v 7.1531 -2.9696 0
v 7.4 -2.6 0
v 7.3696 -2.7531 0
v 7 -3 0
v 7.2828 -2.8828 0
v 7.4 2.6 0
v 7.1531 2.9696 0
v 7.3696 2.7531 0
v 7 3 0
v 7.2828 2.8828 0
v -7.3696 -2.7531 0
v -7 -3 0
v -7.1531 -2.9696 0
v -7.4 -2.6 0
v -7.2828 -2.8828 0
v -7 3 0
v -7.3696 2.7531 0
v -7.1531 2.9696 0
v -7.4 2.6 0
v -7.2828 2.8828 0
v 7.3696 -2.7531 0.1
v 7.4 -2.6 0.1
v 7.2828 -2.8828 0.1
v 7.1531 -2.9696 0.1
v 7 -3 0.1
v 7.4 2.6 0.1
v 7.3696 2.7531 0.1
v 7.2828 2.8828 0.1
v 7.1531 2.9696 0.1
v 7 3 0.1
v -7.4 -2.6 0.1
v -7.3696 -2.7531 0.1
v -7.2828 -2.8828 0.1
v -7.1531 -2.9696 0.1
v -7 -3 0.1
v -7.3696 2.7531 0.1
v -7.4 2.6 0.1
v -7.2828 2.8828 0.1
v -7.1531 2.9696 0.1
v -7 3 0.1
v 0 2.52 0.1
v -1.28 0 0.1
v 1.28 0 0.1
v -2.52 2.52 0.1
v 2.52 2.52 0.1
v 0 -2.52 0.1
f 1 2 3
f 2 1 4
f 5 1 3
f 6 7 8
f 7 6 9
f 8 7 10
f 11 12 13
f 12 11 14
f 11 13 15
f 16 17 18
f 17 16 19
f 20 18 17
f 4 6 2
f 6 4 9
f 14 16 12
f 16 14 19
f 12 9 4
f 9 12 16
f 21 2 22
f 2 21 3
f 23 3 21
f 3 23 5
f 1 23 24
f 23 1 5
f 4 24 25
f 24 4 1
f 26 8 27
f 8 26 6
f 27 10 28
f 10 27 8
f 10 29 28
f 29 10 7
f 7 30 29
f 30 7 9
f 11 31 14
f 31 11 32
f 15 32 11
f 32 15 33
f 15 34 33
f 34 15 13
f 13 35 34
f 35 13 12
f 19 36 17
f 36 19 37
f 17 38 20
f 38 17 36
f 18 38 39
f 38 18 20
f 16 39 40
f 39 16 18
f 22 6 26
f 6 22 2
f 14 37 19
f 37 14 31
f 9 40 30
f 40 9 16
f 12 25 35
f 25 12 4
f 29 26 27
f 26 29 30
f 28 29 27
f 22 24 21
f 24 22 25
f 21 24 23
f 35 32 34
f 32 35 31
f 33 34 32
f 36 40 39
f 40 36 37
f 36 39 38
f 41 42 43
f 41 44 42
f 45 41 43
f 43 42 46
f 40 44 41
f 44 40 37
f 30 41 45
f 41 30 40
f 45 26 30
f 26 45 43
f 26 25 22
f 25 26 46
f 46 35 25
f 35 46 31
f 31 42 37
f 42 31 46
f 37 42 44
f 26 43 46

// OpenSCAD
// file: ../p/1-4cyli.scad
use <../lib.scad>
function ldraw_lib__1_4cyli() = [
// 0 Cylinder 0.25
// 0 Name: 1-4cyli.dat
// 0 Author: James Jessiman
// 0 !LDRAW_ORG Primitive UPDATE 2012-01
// 0 !LICENSE Licensed under CC BY 4.0 : see CAreadme.txt
// 
// 0 BFC CERTIFY CCW
  [0,"BFC","CERTIFY"],
  [0,"BFC","CCW"],
// 
// 0 !HISTORY 2002-03-23 [sbliss] Added BFC statement.
// 0 !HISTORY 2002-04-25 [PTadmin] Official Update 2002-02
// 0 !HISTORY 2007-06-22 [PTadmin] Header formatted for Contributor Agreement
// 0 !HISTORY 2008-07-01 [PTadmin] Official Update 2008-01
// 0 !HISTORY 2012-02-16 [Philo] Changed to CCW
// 0 !HISTORY 2012-03-30 [PTadmin] Official Update 2012-01
// 
// 
// 4 16 1 1 0 0.9239 1 0.3827 0.9239 0 0.3827 1 0 0
  [4,16,1,1,0,0.9239,1,0.3827,0.9239,0,0.3827,1,0,0],
// 5 24 1 0 0 1 1 0 0.9239 0 0.3827 1 0 -1
  [5,24,1,0,0,1,1,0,0.9239,0,0.3827,1,0,-1],
// 4 16 0.9239 1 0.3827 0.7071 1 0.7071 0.7071 0 0.7071 0.9239 0 0.3827
  [4,16,0.9239,1,0.3827,0.7071,1,0.7071,0.7071,0,0.7071,0.9239,0,0.3827],
// 5 24 0.9239 0 0.3827 0.9239 1 0.3827 0.7071 0 0.7071 1 0 0
  [5,24,0.9239,0,0.3827,0.9239,1,0.3827,0.7071,0,0.7071,1,0,0],
// 4 16 0.7071 1 0.7071 0.3827 1 0.9239 0.3827 0 0.9239 0.7071 0 0.7071
  [4,16,0.7071,1,0.7071,0.3827,1,0.9239,0.3827,0,0.9239,0.7071,0,0.7071],
// 5 24 0.7071 0 0.7071 0.7071 1 0.7071 0.3827 0 0.9239 0.9239 0 0.3827
  [5,24,0.7071,0,0.7071,0.7071,1,0.7071,0.3827,0,0.9239,0.9239,0,0.3827],
// 4 16 0.3827 1 0.9239 0 1 1 0 0 1 0.3827 0 0.9239
  [4,16,0.3827,1,0.9239,0,1,1,0,0,1,0.3827,0,0.9239],
// 5 24 0.3827 0 0.9239 0.3827 1 0.9239 0 0 1 0.7071 0 0.7071
  [5,24,0.3827,0,0.9239,0.3827,1,0.9239,0,0,1,0.7071,0,0.7071],
// 5 24 0 0 1 0 1 1 0.3827 0 0.9239 -1 0 1
  [5,24,0,0,1,0,1,1,0.3827,0,0.9239,-1,0,1],
];
module ldraw_lib__1_4cyli(step=0, col=false, unit=2/5, alt=false, line=0.2, solid=!$preview)
    makepoly(ldraw_lib__1_4cyli(), step=step, col=col, unit=unit, alt=alt, line=line, solid=solid);
ldraw_lib__1_4cyli(line=0.2);
// file: ../p/1-4chrd.scad
use <../lib.scad>
function ldraw_lib__1_4chrd() = [
// 0 Chord 0.25
// 0 Name: 1-4chrd.dat
// 0 Author: Max Martin Richter [MMR1988]
// 0 !LDRAW_ORG Primitive UPDATE 2023-05
// 0 !LICENSE Licensed under CC BY 4.0 : see CAreadme.txt
// 
// 0 BFC CERTIFY CCW
  [0,"BFC","CERTIFY"],
  [0,"BFC","CCW"],
// 
// 0 !HISTORY 2004-04-22 [PTadmin] Official Update 2004-02
// 0 !HISTORY 2007-10-09 [PTadmin] Header formatted for Contributor Agreement
// 0 !HISTORY 2008-07-01 [PTadmin] Official Update 2008-01
// 0 !HISTORY 2012-08-02 [MMR1988] Re-creation with PrimGen2 and Rectifier
// 0 !HISTORY 2012-08-09 [PTadmin] Official Update 2012-02
// 0 !HISTORY 2023-10-27 [OrionP] Change author to MMR1988 from hafhead
// 0 !HISTORY 2023-10-31 [OrionP] Official Update 2023-05
// 
// 4 16 0.9239 0 0.3827 0.3827 0 0.9239 0 0 1 1 0 0
  [4,16,0.9239,0,0.3827,0.3827,0,0.9239,0,0,1,1,0,0],
// 3 16 0.7071 0 0.7071 0.3827 0 0.9239 0.9239 0 0.3827
  [3,16,0.7071,0,0.7071,0.3827,0,0.9239,0.9239,0,0.3827],
];
module ldraw_lib__1_4chrd(step=0, col=false, unit=2/5, alt=false, line=0.2, solid=!$preview)
    makepoly(ldraw_lib__1_4chrd(), step=step, col=col, unit=unit, alt=alt, line=line, solid=solid);
ldraw_lib__1_4chrd(line=0.2);
// main file
use <../lib.scad>
use <../p/1-4chrd.scad>
use <../p/1-4cyli.scad>
function ldraw_lib__6429457c() = [
// 0 Sticker  1.9 x  0.8 with Blacktron I Logo
// 0 Name: 6429457c.dat
// 0 Author: Gabriel Läufer [Dr.Bricktacular]
// 0 !LDRAW_ORG Part UPDATE 2025-02
// 0 !LICENSE Licensed under CC BY 4.0 : see CAreadme.txt
// 
// 0 BFC CERTIFY CCW
  [0,"BFC","CERTIFY"],
  [0,"BFC","CCW"],
// 
// 0 !KEYWORDS Blacktron Cruiser, Bricklink 40580stk01, Brickowl 402277
// 0 !KEYWORDS Rebrickable 10102362, Set 40580
// 
// 0 !HISTORY 2025-02-27 [OrionP] Official Update 2025-02
// 
// 0 // Sticker-Bottom
// 1 16 17.5 0 -6.5 1 0 0 0 -1 0 0 0 -1 1-4chrd.dat
  [1,16,17.5,0,-6.5,1,0,0,0,-1,0,0,0,-1, ldraw_lib__1_4chrd()],
// 1 16 17.5 0 6.5 1 0 0 0 -1 0 0 0 1 1-4chrd.dat
  [1,16,17.5,0,6.5,1,0,0,0,-1,0,0,0,1, ldraw_lib__1_4chrd()],
// 1 16 -17.5 0 -6.5 -1 0 0 0 -1 0 0 0 -1 1-4chrd.dat
  [1,16,-17.5,0,-6.5,-1,0,0,0,-1,0,0,0,-1, ldraw_lib__1_4chrd()],
// 1 16 -17.5 0 6.5 -1 0 0 0 -1 0 0 0 1 1-4chrd.dat
  [1,16,-17.5,0,6.5,-1,0,0,0,-1,0,0,0,1, ldraw_lib__1_4chrd()],
// 4 16 18.5 0 6.5 18.5 0 -6.5 17.5 0 -7.5 17.5 0 7.5
  [4,16,18.5,0,6.5,18.5,0,-6.5,17.5,0,-7.5,17.5,0,7.5],
// 4 16 -18.5 0 6.5 -17.5 0 7.5 -17.5 0 -7.5 -18.5 0 -6.5
  [4,16,-18.5,0,6.5,-17.5,0,7.5,-17.5,0,-7.5,-18.5,0,-6.5],
// 4 16 17.5 0 7.5 17.5 0 -7.5 -17.5 0 -7.5 -17.5 0 7.5
  [4,16,17.5,0,7.5,17.5,0,-7.5,-17.5,0,-7.5,-17.5,0,7.5],
// 
// 0 // Sticker-Side
// 1 16 17.5 -0.25 -6.5 1 0 0 0 0.25 0 0 0 -1 1-4cyli.dat
  [1,16,17.5,-0.25,-6.5,1,0,0,0,0.25,0,0,0,-1, ldraw_lib__1_4cyli()],
// 1 16 17.5 -0.25 6.5 1 0 0 0 0.25 0 0 0 1 1-4cyli.dat
  [1,16,17.5,-0.25,6.5,1,0,0,0,0.25,0,0,0,1, ldraw_lib__1_4cyli()],
// 1 16 -17.5 -0.25 -6.5 -1 0 0 0 0.25 0 0 0 -1 1-4cyli.dat
  [1,16,-17.5,-0.25,-6.5,-1,0,0,0,0.25,0,0,0,-1, ldraw_lib__1_4cyli()],
// 1 16 -17.5 -0.25 6.5 -1 0 0 0 0.25 0 0 0 1 1-4cyli.dat
  [1,16,-17.5,-0.25,6.5,-1,0,0,0,0.25,0,0,0,1, ldraw_lib__1_4cyli()],
// 4 16 18.5 0 6.5 18.5 -0.25 6.5 18.5 -0.25 -6.5 18.5 0 -6.5
  [4,16,18.5,0,6.5,18.5,-0.25,6.5,18.5,-0.25,-6.5,18.5,0,-6.5],
// 4 16 -18.5 0 6.5 -18.5 0 -6.5 -18.5 -0.25 -6.5 -18.5 -0.25 6.5
  [4,16,-18.5,0,6.5,-18.5,0,-6.5,-18.5,-0.25,-6.5,-18.5,-0.25,6.5],
// 4 16 -17.5 0 7.5 -17.5 -0.25 7.5 17.5 -0.25 7.5 17.5 0 7.5
  [4,16,-17.5,0,7.5,-17.5,-0.25,7.5,17.5,-0.25,7.5,17.5,0,7.5],
// 4 16 -17.5 0 -7.5 17.5 0 -7.5 17.5 -0.25 -7.5 -17.5 -0.25 -7.5
  [4,16,-17.5,0,-7.5,17.5,0,-7.5,17.5,-0.25,-7.5,-17.5,-0.25,-7.5],
// 
// 0 // Sticker-Front
// 1 0 17.5 -0.25 6.5 1 0 0 0 1 0 0 0 1 1-4chrd.dat
  [1,0,17.5,-0.25,6.5,1,0,0,0,1,0,0,0,1, ldraw_lib__1_4chrd()],
// 1 0 17.5 -0.25 -6.5 1 0 0 0 1 0 0 0 -1 1-4chrd.dat
  [1,0,17.5,-0.25,-6.5,1,0,0,0,1,0,0,0,-1, ldraw_lib__1_4chrd()],
// 1 0 -17.5 -0.25 -6.5 -1 0 0 0 1 0 0 0 -1 1-4chrd.dat
  [1,0,-17.5,-0.25,-6.5,-1,0,0,0,1,0,0,0,-1, ldraw_lib__1_4chrd()],
// 1 0 -17.5 -0.25 6.5 -1 0 0 0 1 0 0 0 1 1-4chrd.dat
  [1,0,-17.5,-0.25,6.5,-1,0,0,0,1,0,0,0,1, ldraw_lib__1_4chrd()],
// 3 0 0 -0.25 6.3 -3.2 -0.25 0 3.2 -0.25 0
  [3,0,0,-0.25,6.3,-3.2,-0.25,0,3.2,-0.25,0],
// 3 14 0 -0.25 6.3 -6.3 -0.25 6.3 -3.2 -0.25 0
  [3,14,0,-0.25,6.3,-6.3,-0.25,6.3,-3.2,-0.25,0],
// 3 14 6.3 -0.25 6.3 0 -0.25 6.3 3.2 -0.25 0
  [3,14,6.3,-0.25,6.3,0,-0.25,6.3,3.2,-0.25,0],
// 3 14 3.2 -0.25 0 -3.2 -0.25 0 0 -0.25 -6.3
  [3,14,3.2,-0.25,0,-3.2,-0.25,0,0,-0.25,-6.3],
// 4 0 -17.5 -0.25 7.5 -18.5 -0.25 6.5 -6.3 -0.25 6.3 0 -0.25 6.3
  [4,0,-17.5,-0.25,7.5,-18.5,-0.25,6.5,-6.3,-0.25,6.3,0,-0.25,6.3],
// 4 0 17.5 -0.25 7.5 -17.5 -0.25 7.5 0 -0.25 6.3 6.3 -0.25 6.3
  [4,0,17.5,-0.25,7.5,-17.5,-0.25,7.5,0,-0.25,6.3,6.3,-0.25,6.3],
// 4 0 18.5 -0.25 6.5 17.5 -0.25 7.5 6.3 -0.25 6.3 3.2 -0.25 0
  [4,0,18.5,-0.25,6.5,17.5,-0.25,7.5,6.3,-0.25,6.3,3.2,-0.25,0],
// 4 0 18.5 -0.25 -6.5 18.5 -0.25 6.5 0 -0.25 -6.3 17.5 -0.25 -7.5
  [4,0,18.5,-0.25,-6.5,18.5,-0.25,6.5,0,-0.25,-6.3,17.5,-0.25,-7.5],
// 4 0 -17.5 -0.25 -7.5 17.5 -0.25 -7.5 0 -0.25 -6.3 -18.5 -0.25 -6.5
  [4,0,-17.5,-0.25,-7.5,17.5,-0.25,-7.5,0,-0.25,-6.3,-18.5,-0.25,-6.5],
// 4 0 -18.5 -0.25 6.5 -18.5 -0.25 -6.5 0 -0.25 -6.3 -3.2 -0.25 0
  [4,0,-18.5,-0.25,6.5,-18.5,-0.25,-6.5,0,-0.25,-6.3,-3.2,-0.25,0],
// 3 0 -18.5 -0.25 6.5 -3.2 -0.25 0 -6.3 -0.25 6.3
  [3,0,-18.5,-0.25,6.5,-3.2,-0.25,0,-6.3,-0.25,6.3],
// 3 0 18.5 -0.25 6.5 3.2 -0.25 0 0 -0.25 -6.3
  [3,0,18.5,-0.25,6.5,3.2,-0.25,0,0,-0.25,-6.3],
];
module ldraw_lib__6429457c(step=0, col=false, unit=2/5, alt=false, line=0.2, solid=!$preview)
    makepoly(ldraw_lib__6429457c(), step=step, col=col, unit=unit, alt=alt, line=line, solid=solid);
ldraw_lib__6429457c(line=0.2);
